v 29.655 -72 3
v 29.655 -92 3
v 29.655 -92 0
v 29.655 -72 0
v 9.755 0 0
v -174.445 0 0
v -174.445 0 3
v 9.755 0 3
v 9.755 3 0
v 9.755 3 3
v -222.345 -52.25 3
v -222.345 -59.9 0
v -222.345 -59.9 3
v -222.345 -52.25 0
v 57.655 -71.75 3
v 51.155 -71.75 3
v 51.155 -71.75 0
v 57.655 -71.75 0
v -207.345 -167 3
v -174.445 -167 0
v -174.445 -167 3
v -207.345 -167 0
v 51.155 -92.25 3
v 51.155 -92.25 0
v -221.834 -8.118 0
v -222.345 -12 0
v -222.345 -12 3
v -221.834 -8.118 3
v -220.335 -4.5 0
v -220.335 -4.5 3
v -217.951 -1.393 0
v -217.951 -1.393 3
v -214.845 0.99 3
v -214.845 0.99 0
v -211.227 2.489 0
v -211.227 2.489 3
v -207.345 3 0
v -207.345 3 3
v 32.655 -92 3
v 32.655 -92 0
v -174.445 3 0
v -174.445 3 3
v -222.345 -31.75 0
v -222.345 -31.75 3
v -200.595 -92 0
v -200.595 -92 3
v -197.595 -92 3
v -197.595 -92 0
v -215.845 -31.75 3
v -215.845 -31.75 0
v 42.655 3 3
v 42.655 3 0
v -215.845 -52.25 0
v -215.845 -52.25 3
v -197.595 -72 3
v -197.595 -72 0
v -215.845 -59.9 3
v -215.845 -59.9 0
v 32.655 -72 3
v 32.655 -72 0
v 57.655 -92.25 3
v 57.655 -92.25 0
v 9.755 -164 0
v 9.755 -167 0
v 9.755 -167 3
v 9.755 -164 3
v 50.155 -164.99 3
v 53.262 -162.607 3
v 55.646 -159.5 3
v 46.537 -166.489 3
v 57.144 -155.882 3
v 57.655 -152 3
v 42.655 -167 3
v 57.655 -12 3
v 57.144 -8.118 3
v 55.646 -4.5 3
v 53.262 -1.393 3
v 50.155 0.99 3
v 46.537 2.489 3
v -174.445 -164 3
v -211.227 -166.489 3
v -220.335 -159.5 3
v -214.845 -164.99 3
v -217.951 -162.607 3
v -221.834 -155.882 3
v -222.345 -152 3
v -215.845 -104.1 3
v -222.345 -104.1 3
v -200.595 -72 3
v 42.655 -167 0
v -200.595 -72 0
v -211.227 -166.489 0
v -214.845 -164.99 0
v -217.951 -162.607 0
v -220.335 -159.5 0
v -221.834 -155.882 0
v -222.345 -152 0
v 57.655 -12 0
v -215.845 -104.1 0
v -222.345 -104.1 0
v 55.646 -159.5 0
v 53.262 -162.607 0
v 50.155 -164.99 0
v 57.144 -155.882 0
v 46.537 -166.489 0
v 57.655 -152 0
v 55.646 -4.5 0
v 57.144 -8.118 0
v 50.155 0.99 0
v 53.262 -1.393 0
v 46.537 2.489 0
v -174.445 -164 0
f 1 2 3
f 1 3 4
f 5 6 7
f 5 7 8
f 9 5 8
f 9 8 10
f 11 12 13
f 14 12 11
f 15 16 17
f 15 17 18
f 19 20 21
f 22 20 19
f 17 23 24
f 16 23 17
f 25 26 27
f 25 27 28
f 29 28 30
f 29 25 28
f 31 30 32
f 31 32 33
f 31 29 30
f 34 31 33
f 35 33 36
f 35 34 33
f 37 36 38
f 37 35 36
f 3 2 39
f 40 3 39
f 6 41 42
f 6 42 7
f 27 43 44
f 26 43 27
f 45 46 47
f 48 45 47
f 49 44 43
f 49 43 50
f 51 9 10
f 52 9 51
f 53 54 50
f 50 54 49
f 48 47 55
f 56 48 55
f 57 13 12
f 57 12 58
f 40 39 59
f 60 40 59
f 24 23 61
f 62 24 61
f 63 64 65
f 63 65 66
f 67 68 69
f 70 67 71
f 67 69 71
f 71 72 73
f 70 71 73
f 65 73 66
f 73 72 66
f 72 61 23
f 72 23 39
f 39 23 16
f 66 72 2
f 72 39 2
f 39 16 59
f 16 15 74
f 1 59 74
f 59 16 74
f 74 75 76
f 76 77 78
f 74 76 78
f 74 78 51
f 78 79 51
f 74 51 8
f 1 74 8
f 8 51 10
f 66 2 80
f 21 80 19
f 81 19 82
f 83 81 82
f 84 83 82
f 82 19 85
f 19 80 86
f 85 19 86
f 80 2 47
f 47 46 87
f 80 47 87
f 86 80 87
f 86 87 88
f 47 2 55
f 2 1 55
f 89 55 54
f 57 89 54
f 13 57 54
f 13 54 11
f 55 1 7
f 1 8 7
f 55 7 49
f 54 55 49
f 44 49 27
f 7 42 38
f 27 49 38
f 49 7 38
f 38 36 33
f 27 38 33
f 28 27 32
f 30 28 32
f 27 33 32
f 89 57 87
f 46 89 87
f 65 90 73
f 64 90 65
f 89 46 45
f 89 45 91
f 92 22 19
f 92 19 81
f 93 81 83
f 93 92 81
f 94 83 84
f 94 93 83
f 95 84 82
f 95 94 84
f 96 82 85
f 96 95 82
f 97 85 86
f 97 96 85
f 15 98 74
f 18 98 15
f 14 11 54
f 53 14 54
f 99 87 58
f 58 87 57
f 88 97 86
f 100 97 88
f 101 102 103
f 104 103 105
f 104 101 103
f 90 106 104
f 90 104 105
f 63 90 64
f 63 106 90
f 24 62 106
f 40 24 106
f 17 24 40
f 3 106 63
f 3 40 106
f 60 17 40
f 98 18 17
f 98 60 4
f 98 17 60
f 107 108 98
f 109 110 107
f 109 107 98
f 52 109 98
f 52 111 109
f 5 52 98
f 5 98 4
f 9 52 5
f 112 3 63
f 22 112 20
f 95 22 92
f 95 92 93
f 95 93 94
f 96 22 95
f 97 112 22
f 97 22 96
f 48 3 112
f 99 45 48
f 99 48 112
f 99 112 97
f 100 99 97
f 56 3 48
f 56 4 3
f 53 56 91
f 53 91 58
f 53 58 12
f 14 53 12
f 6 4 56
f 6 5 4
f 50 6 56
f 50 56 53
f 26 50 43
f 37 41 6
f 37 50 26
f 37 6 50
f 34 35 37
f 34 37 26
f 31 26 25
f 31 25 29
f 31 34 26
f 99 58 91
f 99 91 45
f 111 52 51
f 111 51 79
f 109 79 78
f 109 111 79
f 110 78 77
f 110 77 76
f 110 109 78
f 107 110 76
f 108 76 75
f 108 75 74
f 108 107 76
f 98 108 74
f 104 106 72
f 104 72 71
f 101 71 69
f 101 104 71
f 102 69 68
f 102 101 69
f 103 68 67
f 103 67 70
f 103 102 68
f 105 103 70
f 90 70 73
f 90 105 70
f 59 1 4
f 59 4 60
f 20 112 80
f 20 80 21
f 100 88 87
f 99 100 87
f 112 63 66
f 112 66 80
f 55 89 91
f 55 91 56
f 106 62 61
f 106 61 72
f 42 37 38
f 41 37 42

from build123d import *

# Parameters (mm, degrees)
SALIENTE_EXTRUIR2_DEPTH = 3
CROQUIS2_W              = 6.5
CROQUIS2_H              = 20.5
CROQUIS2_H_2            = 44.2
CROQUIS2_W_2            = 3
CROQUIS2_H_3            = 20
CORTAR_EXTRUIR1_DEPTH   = 3


with BuildPart() as part:
    # Croquis1 → Saliente-Extruir2 (new body)
    with BuildSketch(Plane.XY):
        with BuildLine():
            Line((-207.344846765, 3), (-174.444846765, 3))
            Line((-174.444846765, 3), (-174.444846765, 0))
            Line((-174.444846765, 0), (9.755153235, 0))
            Line((9.755153235, 0), (9.755153235, 3))
            Line((9.755153235, 3), (42.655153235, 3))
            ThreePointArc((42.655153235, 3), (53.261754953, -1.393398282), (57.655153235, -12))
            Line((57.655153235, -12), (57.655153235, -152))
            ThreePointArc((57.655153235, -152), (53.261754953, -162.606601718), (42.655153235, -167))
            Line((42.655153235, -167), (9.755153235, -167))
            Line((9.755153235, -167), (9.755153235, -164))
            Line((9.755153235, -164), (-174.444846765, -164))
            Line((-174.444846765, -164), (-174.444846765, -167))
            Line((-174.444846765, -167), (-207.344846765, -167))
            ThreePointArc((-207.344846765, -167), (-217.951448483, -162.606601718), (-222.344846765, -152))
            Line((-222.344846765, -152), (-222.344846765, -12))
            ThreePointArc((-222.344846765, -12), (-217.951448483, -1.393398282), (-207.344846765, 3))
        make_face()
    extrude(amount=SALIENTE_EXTRUIR2_DEPTH)

    # Croquis2 → Cortar-Extruir1 (cut)
    with BuildSketch(Plane.XY.offset(3)):
        with Locations((-219.094846765, -42)):
            Rectangle(CROQUIS2_W, CROQUIS2_H)
        with Locations((-219.094846765, -82)):
            Rectangle(CROQUIS2_W, CROQUIS2_H_2)
        with Locations((54.405153235, -82)):
            Rectangle(CROQUIS2_W, CROQUIS2_H)
        with Locations((-199.094846765, -82)):
            Rectangle(CROQUIS2_W_2, CROQUIS2_H_3)
        with Locations((31.155153235, -82)):
            Rectangle(CROQUIS2_W_2, CROQUIS2_H_3)
    extrude(amount=-CORTAR_EXTRUIR1_DEPTH, mode=Mode.SUBTRACT)


solid = part.part
